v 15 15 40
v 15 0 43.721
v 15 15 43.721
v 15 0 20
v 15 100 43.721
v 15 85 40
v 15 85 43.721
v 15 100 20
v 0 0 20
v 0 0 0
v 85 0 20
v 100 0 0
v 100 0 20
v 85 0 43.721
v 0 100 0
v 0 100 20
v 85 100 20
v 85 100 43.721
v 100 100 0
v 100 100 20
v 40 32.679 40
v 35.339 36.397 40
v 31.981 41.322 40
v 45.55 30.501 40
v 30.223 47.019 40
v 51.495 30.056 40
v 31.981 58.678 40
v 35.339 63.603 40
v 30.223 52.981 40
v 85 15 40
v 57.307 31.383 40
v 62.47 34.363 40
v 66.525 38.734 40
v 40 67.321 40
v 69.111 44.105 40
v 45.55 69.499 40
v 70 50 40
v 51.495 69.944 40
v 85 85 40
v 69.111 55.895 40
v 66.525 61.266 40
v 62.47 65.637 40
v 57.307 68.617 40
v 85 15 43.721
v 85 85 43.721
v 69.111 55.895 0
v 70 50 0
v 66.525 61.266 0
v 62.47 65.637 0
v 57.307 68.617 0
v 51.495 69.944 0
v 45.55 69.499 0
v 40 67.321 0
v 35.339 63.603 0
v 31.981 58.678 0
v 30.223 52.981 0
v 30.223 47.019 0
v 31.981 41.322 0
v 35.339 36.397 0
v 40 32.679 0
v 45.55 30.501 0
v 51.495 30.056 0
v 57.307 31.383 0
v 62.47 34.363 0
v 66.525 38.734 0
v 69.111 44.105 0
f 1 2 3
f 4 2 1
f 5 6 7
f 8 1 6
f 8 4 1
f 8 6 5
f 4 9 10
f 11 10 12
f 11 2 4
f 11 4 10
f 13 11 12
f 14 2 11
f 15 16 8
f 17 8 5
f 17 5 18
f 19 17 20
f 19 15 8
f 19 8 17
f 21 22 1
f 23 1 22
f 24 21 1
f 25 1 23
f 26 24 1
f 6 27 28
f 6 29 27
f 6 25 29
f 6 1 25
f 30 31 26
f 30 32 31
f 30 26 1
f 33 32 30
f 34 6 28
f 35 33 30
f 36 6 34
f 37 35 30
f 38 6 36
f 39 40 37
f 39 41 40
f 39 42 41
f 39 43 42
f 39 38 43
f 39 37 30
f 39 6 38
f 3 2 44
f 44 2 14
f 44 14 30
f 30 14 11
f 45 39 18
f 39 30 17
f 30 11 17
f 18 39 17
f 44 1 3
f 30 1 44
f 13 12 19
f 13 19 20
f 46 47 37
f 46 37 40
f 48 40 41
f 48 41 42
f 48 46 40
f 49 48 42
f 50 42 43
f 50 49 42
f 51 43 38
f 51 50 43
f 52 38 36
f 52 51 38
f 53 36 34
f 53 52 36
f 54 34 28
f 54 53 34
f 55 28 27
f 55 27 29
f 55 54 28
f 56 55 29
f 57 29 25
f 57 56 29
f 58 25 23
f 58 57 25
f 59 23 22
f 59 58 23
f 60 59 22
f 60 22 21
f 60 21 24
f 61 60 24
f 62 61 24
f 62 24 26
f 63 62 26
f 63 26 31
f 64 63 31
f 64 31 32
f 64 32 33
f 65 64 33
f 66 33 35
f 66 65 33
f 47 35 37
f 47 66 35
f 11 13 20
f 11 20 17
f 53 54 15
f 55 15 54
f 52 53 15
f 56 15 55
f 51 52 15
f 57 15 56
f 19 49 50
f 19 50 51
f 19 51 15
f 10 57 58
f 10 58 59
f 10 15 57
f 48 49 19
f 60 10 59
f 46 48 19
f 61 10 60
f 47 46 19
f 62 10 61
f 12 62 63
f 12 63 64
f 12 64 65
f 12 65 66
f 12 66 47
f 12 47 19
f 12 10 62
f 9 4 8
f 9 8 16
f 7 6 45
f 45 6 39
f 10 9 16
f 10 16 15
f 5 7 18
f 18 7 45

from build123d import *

# Parameters (mm, degrees)
F0_W     = 70
F0_H     = 23.720817
F2_DEPTH = 1000
F1_W     = 100
F1_H     = 100
F1_W_2   = 70
F1_H_2   = 70
F3_DEPTH = 1000
F1_R     = 20
F4_DEPTH = 40


with BuildPart() as f2:
    # F0 (on Front) → F2 (new body)
    with BuildSketch(Plane.XZ):
        Polygon((0, 20), (0, 0), (100, 0), (100, 20), (85, 20), (15, 20), align=None)
        with Locations((50, 31.860408)):
            Rectangle(F0_W, F0_H)
    extrude(amount=-F2_DEPTH)

    # F1 (on Top) → F3 (intersect)
    with BuildSketch(Plane.XY):
        with Locations((50, 50)):
            Rectangle(F1_W, F1_H)
        with Locations((50, 50)):
            Rectangle(F1_W_2, F1_H_2, mode=Mode.SUBTRACT)
    extrude(amount=F3_DEPTH, mode=Mode.INTERSECT)

    # F1 (on Top) → F4 (join)
    with BuildSketch(Plane.XY):
        with Locations((50, 50)):
            Rectangle(F1_W_2, F1_H_2)
        with Locations((50, 50)):
            Circle(F1_R, mode=Mode.SUBTRACT)
    extrude(amount=F4_DEPTH)


solid = f2.part
